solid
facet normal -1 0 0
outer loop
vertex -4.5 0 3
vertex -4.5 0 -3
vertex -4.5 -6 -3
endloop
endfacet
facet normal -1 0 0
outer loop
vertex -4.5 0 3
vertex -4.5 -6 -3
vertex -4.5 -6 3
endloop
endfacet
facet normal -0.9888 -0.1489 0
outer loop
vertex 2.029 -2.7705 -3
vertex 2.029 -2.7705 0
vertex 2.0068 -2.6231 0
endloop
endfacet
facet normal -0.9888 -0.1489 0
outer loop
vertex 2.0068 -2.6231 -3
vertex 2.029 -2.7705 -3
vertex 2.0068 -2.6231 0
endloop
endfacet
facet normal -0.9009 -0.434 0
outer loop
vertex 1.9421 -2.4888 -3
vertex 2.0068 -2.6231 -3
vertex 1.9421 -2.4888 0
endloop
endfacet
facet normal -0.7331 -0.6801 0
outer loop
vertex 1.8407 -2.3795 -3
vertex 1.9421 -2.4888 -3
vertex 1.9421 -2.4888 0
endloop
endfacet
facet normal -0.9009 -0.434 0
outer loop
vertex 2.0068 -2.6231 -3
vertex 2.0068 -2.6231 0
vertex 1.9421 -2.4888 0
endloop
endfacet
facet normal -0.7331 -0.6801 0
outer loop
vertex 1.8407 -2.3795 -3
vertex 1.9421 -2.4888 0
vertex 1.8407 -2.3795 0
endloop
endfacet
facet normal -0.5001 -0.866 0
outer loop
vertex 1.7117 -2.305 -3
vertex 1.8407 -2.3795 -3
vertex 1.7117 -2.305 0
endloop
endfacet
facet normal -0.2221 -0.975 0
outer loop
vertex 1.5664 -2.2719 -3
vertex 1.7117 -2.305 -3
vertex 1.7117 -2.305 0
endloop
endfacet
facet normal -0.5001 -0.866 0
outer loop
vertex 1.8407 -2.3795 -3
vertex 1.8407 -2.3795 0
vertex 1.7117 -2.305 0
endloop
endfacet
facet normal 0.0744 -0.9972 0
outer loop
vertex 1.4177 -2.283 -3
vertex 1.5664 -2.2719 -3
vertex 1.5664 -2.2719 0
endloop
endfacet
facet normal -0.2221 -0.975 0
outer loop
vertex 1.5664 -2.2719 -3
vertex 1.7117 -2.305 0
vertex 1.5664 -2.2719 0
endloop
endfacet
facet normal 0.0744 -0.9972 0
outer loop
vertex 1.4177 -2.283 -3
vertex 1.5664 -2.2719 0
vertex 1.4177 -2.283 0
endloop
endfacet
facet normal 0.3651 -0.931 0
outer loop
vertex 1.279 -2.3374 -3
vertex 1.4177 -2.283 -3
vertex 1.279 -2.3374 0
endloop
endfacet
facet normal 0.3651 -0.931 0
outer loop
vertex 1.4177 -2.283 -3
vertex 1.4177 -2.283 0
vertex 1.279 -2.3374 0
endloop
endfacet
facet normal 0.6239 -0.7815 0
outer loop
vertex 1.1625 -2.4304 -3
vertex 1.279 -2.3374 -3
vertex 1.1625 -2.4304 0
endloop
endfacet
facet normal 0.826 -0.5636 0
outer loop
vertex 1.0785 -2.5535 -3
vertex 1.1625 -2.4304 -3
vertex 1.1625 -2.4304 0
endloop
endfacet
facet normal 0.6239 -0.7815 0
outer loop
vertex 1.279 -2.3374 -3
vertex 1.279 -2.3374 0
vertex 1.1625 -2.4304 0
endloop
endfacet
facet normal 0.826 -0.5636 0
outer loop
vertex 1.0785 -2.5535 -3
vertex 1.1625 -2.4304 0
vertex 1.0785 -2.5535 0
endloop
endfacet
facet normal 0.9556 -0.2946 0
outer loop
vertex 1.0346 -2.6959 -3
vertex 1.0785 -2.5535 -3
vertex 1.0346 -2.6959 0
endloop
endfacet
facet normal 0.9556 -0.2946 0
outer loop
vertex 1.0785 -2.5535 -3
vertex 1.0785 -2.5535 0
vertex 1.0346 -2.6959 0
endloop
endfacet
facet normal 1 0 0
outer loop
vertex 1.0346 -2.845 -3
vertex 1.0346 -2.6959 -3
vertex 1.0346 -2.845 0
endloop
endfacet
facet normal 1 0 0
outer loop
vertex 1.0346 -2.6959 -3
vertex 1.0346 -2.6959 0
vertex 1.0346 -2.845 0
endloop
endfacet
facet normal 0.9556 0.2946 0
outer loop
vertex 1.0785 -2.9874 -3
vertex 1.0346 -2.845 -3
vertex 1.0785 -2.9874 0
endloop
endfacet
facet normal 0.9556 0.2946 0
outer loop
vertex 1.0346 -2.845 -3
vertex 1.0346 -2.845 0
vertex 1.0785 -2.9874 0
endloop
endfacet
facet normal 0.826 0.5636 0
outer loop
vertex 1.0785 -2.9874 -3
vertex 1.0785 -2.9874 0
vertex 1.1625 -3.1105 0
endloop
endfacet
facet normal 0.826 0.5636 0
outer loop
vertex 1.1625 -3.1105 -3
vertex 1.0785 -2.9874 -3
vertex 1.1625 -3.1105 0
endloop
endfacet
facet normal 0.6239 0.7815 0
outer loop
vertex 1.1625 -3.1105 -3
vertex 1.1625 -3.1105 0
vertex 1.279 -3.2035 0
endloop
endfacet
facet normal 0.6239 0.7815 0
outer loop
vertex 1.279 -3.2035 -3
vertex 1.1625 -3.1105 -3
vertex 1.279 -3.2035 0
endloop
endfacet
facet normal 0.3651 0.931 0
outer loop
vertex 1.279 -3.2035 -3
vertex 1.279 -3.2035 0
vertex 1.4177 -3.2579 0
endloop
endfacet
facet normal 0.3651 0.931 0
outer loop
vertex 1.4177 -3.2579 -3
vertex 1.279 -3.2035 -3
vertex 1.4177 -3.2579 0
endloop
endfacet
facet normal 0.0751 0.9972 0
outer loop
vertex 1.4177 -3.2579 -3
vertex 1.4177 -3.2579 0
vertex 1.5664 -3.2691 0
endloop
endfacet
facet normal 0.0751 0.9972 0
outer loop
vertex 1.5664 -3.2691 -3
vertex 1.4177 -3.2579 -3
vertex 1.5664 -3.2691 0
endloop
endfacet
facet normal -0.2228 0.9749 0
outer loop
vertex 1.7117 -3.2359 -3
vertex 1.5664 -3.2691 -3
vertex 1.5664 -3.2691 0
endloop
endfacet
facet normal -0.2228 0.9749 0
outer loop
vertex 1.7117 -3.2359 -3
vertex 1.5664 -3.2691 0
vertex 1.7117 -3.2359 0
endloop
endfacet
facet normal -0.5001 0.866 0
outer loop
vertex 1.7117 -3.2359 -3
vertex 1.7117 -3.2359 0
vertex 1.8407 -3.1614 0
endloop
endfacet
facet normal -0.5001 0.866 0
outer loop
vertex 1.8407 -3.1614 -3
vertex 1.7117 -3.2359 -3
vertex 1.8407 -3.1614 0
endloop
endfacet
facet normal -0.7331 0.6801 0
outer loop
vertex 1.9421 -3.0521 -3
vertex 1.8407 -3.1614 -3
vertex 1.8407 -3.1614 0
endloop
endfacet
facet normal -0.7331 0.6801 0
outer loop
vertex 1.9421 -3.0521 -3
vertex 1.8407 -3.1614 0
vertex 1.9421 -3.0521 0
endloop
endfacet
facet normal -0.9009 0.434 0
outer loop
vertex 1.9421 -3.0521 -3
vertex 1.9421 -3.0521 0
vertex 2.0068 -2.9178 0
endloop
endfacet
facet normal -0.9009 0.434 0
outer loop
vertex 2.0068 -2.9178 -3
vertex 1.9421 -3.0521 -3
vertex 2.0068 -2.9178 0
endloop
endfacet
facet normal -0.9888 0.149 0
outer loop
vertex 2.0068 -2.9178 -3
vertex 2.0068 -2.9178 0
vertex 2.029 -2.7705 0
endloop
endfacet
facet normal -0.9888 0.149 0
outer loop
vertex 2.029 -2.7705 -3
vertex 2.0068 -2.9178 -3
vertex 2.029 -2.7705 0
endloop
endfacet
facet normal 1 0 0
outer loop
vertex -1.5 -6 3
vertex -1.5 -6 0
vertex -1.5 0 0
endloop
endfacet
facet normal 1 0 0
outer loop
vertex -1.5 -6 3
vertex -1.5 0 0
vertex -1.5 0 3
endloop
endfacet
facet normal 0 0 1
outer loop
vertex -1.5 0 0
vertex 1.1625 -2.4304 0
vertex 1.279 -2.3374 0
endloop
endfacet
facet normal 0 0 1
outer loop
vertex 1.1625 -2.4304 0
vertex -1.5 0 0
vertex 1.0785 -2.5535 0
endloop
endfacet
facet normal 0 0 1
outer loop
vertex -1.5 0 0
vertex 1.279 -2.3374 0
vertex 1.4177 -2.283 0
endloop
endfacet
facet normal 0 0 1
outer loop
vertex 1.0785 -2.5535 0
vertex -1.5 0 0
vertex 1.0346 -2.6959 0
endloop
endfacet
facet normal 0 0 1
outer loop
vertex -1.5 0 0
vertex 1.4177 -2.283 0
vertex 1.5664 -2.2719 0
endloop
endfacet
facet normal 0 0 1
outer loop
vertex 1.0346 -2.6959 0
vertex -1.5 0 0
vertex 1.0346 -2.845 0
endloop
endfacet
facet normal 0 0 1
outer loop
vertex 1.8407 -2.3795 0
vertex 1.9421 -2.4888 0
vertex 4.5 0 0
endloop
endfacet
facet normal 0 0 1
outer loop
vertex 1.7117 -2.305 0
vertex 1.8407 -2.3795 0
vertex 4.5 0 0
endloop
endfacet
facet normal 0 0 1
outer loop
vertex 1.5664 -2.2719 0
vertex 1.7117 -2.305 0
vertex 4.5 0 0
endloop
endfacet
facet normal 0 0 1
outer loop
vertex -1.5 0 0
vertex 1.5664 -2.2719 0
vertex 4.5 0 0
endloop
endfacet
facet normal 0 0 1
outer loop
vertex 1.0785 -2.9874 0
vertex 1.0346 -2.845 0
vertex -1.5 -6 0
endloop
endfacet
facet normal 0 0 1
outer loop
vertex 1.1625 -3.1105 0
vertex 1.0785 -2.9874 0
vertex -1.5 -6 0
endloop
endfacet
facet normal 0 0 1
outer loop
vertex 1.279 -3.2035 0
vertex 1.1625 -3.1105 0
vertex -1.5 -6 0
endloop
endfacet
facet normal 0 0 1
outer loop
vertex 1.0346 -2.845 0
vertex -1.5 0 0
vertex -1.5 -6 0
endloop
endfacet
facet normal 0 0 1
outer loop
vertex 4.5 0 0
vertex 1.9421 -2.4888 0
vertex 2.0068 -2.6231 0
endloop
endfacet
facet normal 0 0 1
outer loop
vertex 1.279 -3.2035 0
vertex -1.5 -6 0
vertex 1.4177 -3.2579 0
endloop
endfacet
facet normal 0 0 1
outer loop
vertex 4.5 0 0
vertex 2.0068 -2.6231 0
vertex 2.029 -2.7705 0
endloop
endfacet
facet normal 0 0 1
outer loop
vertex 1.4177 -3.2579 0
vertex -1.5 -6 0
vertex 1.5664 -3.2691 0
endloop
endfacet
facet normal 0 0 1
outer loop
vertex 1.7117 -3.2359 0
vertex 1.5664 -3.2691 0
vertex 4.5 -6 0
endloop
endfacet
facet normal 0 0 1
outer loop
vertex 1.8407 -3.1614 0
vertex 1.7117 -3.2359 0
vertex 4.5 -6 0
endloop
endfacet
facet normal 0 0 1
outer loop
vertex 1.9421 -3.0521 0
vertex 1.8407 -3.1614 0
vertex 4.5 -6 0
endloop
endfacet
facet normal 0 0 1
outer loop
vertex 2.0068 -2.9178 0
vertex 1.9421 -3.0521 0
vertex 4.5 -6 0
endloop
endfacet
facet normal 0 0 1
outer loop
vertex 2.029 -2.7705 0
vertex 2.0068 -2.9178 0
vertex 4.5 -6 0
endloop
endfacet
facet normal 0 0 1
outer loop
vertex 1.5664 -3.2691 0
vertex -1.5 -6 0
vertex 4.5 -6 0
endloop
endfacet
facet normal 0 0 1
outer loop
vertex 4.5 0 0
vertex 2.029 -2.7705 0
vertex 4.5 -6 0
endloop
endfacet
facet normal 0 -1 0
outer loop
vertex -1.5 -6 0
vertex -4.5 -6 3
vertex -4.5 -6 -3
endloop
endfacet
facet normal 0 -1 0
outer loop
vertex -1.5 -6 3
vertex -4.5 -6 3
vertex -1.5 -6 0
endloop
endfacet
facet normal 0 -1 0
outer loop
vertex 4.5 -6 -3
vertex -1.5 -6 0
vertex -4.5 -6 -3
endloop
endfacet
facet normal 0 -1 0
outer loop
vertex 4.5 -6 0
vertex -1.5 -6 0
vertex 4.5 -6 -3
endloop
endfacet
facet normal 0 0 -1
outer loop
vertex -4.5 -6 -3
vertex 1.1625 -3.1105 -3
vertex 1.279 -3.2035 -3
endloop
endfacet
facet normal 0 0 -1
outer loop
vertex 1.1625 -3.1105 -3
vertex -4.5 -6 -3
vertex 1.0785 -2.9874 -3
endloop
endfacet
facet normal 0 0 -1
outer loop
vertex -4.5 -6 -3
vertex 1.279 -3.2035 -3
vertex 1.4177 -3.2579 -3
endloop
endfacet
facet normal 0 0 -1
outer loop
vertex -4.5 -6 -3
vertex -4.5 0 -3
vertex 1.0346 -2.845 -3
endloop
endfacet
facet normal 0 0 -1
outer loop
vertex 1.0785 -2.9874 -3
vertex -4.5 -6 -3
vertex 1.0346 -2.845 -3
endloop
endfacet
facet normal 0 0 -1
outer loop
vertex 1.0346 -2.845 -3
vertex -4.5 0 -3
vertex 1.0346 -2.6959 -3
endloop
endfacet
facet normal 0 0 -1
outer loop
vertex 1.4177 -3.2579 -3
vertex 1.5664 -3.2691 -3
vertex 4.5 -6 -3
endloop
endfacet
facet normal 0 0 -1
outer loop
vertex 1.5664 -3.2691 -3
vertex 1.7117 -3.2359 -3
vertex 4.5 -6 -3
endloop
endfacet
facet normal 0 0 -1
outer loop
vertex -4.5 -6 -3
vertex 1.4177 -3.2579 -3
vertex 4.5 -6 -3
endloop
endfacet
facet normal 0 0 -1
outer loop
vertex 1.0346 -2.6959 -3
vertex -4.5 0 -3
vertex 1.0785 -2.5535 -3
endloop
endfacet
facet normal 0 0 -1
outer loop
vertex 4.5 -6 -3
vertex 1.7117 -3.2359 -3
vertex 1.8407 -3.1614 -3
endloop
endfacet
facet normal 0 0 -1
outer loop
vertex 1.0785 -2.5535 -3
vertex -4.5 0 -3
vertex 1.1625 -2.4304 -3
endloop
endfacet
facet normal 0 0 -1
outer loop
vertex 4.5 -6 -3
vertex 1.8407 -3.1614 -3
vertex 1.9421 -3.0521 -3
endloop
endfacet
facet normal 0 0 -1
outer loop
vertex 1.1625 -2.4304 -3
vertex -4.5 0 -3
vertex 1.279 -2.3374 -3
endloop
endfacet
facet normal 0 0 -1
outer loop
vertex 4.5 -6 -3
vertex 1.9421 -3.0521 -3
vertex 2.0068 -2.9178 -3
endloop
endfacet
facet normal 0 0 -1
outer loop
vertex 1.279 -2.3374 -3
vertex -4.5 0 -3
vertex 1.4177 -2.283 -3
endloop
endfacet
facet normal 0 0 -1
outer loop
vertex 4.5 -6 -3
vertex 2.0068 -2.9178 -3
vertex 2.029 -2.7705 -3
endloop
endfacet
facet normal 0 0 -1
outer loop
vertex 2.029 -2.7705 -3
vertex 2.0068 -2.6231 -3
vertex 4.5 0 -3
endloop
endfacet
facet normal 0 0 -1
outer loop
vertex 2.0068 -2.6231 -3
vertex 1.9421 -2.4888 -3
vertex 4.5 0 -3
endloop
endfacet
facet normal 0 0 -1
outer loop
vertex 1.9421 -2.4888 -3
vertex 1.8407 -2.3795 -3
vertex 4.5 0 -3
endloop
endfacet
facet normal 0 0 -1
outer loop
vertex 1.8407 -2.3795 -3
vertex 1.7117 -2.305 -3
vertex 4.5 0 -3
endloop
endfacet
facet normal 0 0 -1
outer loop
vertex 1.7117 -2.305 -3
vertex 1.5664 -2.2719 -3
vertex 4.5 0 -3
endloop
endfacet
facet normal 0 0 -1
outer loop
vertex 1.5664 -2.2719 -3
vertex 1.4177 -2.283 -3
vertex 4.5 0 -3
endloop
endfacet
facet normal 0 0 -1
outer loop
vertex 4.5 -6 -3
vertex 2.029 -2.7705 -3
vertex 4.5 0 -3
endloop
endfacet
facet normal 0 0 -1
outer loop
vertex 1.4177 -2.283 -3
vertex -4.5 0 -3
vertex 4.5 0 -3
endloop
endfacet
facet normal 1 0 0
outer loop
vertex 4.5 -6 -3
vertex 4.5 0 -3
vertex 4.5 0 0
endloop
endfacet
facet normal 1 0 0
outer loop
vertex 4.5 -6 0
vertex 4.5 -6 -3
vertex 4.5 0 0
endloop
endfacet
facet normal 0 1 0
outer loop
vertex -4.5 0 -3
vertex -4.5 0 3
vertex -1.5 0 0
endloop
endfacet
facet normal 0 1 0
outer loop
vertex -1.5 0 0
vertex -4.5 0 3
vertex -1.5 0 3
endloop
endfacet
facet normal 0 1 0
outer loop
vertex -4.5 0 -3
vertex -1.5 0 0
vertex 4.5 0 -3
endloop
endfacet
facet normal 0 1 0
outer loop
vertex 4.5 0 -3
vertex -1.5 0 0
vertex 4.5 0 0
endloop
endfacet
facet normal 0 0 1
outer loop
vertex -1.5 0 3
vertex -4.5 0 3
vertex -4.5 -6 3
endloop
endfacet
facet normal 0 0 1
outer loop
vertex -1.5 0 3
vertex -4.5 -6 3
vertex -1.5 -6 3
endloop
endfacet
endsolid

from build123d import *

# Parameters (mm, degrees)
F0_W     = 9
F0_H     = 6
F1_DEPTH = 6
F2_W     = 6
F2_H     = 3
F3_DEPTH = 6.001
F4_R     = 0.5
F5_DEPTH = 3.001


with BuildPart() as f1:
    # F0 (on Front) → F1 (new body)
    with BuildSketch(Plane.XZ):
        Rectangle(F0_W, F0_H)
    extrude(amount=F1_DEPTH)

    # F2 (on face) → F3 (cut, through all)
    with BuildSketch(Plane.XZ.offset(6)):
        with Locations((1.5, 1.5)):
            Rectangle(F2_W, F2_H)
    extrude(amount=-F3_DEPTH, mode=Mode.SUBTRACT)

    # F4 (on face) → F5 (cut, through all)
    with BuildSketch(Plane.XY):
        with Locations((1.528993, -2.770453)):
            Circle(F4_R)
    extrude(amount=-F5_DEPTH, mode=Mode.SUBTRACT)


solid = f1.part
